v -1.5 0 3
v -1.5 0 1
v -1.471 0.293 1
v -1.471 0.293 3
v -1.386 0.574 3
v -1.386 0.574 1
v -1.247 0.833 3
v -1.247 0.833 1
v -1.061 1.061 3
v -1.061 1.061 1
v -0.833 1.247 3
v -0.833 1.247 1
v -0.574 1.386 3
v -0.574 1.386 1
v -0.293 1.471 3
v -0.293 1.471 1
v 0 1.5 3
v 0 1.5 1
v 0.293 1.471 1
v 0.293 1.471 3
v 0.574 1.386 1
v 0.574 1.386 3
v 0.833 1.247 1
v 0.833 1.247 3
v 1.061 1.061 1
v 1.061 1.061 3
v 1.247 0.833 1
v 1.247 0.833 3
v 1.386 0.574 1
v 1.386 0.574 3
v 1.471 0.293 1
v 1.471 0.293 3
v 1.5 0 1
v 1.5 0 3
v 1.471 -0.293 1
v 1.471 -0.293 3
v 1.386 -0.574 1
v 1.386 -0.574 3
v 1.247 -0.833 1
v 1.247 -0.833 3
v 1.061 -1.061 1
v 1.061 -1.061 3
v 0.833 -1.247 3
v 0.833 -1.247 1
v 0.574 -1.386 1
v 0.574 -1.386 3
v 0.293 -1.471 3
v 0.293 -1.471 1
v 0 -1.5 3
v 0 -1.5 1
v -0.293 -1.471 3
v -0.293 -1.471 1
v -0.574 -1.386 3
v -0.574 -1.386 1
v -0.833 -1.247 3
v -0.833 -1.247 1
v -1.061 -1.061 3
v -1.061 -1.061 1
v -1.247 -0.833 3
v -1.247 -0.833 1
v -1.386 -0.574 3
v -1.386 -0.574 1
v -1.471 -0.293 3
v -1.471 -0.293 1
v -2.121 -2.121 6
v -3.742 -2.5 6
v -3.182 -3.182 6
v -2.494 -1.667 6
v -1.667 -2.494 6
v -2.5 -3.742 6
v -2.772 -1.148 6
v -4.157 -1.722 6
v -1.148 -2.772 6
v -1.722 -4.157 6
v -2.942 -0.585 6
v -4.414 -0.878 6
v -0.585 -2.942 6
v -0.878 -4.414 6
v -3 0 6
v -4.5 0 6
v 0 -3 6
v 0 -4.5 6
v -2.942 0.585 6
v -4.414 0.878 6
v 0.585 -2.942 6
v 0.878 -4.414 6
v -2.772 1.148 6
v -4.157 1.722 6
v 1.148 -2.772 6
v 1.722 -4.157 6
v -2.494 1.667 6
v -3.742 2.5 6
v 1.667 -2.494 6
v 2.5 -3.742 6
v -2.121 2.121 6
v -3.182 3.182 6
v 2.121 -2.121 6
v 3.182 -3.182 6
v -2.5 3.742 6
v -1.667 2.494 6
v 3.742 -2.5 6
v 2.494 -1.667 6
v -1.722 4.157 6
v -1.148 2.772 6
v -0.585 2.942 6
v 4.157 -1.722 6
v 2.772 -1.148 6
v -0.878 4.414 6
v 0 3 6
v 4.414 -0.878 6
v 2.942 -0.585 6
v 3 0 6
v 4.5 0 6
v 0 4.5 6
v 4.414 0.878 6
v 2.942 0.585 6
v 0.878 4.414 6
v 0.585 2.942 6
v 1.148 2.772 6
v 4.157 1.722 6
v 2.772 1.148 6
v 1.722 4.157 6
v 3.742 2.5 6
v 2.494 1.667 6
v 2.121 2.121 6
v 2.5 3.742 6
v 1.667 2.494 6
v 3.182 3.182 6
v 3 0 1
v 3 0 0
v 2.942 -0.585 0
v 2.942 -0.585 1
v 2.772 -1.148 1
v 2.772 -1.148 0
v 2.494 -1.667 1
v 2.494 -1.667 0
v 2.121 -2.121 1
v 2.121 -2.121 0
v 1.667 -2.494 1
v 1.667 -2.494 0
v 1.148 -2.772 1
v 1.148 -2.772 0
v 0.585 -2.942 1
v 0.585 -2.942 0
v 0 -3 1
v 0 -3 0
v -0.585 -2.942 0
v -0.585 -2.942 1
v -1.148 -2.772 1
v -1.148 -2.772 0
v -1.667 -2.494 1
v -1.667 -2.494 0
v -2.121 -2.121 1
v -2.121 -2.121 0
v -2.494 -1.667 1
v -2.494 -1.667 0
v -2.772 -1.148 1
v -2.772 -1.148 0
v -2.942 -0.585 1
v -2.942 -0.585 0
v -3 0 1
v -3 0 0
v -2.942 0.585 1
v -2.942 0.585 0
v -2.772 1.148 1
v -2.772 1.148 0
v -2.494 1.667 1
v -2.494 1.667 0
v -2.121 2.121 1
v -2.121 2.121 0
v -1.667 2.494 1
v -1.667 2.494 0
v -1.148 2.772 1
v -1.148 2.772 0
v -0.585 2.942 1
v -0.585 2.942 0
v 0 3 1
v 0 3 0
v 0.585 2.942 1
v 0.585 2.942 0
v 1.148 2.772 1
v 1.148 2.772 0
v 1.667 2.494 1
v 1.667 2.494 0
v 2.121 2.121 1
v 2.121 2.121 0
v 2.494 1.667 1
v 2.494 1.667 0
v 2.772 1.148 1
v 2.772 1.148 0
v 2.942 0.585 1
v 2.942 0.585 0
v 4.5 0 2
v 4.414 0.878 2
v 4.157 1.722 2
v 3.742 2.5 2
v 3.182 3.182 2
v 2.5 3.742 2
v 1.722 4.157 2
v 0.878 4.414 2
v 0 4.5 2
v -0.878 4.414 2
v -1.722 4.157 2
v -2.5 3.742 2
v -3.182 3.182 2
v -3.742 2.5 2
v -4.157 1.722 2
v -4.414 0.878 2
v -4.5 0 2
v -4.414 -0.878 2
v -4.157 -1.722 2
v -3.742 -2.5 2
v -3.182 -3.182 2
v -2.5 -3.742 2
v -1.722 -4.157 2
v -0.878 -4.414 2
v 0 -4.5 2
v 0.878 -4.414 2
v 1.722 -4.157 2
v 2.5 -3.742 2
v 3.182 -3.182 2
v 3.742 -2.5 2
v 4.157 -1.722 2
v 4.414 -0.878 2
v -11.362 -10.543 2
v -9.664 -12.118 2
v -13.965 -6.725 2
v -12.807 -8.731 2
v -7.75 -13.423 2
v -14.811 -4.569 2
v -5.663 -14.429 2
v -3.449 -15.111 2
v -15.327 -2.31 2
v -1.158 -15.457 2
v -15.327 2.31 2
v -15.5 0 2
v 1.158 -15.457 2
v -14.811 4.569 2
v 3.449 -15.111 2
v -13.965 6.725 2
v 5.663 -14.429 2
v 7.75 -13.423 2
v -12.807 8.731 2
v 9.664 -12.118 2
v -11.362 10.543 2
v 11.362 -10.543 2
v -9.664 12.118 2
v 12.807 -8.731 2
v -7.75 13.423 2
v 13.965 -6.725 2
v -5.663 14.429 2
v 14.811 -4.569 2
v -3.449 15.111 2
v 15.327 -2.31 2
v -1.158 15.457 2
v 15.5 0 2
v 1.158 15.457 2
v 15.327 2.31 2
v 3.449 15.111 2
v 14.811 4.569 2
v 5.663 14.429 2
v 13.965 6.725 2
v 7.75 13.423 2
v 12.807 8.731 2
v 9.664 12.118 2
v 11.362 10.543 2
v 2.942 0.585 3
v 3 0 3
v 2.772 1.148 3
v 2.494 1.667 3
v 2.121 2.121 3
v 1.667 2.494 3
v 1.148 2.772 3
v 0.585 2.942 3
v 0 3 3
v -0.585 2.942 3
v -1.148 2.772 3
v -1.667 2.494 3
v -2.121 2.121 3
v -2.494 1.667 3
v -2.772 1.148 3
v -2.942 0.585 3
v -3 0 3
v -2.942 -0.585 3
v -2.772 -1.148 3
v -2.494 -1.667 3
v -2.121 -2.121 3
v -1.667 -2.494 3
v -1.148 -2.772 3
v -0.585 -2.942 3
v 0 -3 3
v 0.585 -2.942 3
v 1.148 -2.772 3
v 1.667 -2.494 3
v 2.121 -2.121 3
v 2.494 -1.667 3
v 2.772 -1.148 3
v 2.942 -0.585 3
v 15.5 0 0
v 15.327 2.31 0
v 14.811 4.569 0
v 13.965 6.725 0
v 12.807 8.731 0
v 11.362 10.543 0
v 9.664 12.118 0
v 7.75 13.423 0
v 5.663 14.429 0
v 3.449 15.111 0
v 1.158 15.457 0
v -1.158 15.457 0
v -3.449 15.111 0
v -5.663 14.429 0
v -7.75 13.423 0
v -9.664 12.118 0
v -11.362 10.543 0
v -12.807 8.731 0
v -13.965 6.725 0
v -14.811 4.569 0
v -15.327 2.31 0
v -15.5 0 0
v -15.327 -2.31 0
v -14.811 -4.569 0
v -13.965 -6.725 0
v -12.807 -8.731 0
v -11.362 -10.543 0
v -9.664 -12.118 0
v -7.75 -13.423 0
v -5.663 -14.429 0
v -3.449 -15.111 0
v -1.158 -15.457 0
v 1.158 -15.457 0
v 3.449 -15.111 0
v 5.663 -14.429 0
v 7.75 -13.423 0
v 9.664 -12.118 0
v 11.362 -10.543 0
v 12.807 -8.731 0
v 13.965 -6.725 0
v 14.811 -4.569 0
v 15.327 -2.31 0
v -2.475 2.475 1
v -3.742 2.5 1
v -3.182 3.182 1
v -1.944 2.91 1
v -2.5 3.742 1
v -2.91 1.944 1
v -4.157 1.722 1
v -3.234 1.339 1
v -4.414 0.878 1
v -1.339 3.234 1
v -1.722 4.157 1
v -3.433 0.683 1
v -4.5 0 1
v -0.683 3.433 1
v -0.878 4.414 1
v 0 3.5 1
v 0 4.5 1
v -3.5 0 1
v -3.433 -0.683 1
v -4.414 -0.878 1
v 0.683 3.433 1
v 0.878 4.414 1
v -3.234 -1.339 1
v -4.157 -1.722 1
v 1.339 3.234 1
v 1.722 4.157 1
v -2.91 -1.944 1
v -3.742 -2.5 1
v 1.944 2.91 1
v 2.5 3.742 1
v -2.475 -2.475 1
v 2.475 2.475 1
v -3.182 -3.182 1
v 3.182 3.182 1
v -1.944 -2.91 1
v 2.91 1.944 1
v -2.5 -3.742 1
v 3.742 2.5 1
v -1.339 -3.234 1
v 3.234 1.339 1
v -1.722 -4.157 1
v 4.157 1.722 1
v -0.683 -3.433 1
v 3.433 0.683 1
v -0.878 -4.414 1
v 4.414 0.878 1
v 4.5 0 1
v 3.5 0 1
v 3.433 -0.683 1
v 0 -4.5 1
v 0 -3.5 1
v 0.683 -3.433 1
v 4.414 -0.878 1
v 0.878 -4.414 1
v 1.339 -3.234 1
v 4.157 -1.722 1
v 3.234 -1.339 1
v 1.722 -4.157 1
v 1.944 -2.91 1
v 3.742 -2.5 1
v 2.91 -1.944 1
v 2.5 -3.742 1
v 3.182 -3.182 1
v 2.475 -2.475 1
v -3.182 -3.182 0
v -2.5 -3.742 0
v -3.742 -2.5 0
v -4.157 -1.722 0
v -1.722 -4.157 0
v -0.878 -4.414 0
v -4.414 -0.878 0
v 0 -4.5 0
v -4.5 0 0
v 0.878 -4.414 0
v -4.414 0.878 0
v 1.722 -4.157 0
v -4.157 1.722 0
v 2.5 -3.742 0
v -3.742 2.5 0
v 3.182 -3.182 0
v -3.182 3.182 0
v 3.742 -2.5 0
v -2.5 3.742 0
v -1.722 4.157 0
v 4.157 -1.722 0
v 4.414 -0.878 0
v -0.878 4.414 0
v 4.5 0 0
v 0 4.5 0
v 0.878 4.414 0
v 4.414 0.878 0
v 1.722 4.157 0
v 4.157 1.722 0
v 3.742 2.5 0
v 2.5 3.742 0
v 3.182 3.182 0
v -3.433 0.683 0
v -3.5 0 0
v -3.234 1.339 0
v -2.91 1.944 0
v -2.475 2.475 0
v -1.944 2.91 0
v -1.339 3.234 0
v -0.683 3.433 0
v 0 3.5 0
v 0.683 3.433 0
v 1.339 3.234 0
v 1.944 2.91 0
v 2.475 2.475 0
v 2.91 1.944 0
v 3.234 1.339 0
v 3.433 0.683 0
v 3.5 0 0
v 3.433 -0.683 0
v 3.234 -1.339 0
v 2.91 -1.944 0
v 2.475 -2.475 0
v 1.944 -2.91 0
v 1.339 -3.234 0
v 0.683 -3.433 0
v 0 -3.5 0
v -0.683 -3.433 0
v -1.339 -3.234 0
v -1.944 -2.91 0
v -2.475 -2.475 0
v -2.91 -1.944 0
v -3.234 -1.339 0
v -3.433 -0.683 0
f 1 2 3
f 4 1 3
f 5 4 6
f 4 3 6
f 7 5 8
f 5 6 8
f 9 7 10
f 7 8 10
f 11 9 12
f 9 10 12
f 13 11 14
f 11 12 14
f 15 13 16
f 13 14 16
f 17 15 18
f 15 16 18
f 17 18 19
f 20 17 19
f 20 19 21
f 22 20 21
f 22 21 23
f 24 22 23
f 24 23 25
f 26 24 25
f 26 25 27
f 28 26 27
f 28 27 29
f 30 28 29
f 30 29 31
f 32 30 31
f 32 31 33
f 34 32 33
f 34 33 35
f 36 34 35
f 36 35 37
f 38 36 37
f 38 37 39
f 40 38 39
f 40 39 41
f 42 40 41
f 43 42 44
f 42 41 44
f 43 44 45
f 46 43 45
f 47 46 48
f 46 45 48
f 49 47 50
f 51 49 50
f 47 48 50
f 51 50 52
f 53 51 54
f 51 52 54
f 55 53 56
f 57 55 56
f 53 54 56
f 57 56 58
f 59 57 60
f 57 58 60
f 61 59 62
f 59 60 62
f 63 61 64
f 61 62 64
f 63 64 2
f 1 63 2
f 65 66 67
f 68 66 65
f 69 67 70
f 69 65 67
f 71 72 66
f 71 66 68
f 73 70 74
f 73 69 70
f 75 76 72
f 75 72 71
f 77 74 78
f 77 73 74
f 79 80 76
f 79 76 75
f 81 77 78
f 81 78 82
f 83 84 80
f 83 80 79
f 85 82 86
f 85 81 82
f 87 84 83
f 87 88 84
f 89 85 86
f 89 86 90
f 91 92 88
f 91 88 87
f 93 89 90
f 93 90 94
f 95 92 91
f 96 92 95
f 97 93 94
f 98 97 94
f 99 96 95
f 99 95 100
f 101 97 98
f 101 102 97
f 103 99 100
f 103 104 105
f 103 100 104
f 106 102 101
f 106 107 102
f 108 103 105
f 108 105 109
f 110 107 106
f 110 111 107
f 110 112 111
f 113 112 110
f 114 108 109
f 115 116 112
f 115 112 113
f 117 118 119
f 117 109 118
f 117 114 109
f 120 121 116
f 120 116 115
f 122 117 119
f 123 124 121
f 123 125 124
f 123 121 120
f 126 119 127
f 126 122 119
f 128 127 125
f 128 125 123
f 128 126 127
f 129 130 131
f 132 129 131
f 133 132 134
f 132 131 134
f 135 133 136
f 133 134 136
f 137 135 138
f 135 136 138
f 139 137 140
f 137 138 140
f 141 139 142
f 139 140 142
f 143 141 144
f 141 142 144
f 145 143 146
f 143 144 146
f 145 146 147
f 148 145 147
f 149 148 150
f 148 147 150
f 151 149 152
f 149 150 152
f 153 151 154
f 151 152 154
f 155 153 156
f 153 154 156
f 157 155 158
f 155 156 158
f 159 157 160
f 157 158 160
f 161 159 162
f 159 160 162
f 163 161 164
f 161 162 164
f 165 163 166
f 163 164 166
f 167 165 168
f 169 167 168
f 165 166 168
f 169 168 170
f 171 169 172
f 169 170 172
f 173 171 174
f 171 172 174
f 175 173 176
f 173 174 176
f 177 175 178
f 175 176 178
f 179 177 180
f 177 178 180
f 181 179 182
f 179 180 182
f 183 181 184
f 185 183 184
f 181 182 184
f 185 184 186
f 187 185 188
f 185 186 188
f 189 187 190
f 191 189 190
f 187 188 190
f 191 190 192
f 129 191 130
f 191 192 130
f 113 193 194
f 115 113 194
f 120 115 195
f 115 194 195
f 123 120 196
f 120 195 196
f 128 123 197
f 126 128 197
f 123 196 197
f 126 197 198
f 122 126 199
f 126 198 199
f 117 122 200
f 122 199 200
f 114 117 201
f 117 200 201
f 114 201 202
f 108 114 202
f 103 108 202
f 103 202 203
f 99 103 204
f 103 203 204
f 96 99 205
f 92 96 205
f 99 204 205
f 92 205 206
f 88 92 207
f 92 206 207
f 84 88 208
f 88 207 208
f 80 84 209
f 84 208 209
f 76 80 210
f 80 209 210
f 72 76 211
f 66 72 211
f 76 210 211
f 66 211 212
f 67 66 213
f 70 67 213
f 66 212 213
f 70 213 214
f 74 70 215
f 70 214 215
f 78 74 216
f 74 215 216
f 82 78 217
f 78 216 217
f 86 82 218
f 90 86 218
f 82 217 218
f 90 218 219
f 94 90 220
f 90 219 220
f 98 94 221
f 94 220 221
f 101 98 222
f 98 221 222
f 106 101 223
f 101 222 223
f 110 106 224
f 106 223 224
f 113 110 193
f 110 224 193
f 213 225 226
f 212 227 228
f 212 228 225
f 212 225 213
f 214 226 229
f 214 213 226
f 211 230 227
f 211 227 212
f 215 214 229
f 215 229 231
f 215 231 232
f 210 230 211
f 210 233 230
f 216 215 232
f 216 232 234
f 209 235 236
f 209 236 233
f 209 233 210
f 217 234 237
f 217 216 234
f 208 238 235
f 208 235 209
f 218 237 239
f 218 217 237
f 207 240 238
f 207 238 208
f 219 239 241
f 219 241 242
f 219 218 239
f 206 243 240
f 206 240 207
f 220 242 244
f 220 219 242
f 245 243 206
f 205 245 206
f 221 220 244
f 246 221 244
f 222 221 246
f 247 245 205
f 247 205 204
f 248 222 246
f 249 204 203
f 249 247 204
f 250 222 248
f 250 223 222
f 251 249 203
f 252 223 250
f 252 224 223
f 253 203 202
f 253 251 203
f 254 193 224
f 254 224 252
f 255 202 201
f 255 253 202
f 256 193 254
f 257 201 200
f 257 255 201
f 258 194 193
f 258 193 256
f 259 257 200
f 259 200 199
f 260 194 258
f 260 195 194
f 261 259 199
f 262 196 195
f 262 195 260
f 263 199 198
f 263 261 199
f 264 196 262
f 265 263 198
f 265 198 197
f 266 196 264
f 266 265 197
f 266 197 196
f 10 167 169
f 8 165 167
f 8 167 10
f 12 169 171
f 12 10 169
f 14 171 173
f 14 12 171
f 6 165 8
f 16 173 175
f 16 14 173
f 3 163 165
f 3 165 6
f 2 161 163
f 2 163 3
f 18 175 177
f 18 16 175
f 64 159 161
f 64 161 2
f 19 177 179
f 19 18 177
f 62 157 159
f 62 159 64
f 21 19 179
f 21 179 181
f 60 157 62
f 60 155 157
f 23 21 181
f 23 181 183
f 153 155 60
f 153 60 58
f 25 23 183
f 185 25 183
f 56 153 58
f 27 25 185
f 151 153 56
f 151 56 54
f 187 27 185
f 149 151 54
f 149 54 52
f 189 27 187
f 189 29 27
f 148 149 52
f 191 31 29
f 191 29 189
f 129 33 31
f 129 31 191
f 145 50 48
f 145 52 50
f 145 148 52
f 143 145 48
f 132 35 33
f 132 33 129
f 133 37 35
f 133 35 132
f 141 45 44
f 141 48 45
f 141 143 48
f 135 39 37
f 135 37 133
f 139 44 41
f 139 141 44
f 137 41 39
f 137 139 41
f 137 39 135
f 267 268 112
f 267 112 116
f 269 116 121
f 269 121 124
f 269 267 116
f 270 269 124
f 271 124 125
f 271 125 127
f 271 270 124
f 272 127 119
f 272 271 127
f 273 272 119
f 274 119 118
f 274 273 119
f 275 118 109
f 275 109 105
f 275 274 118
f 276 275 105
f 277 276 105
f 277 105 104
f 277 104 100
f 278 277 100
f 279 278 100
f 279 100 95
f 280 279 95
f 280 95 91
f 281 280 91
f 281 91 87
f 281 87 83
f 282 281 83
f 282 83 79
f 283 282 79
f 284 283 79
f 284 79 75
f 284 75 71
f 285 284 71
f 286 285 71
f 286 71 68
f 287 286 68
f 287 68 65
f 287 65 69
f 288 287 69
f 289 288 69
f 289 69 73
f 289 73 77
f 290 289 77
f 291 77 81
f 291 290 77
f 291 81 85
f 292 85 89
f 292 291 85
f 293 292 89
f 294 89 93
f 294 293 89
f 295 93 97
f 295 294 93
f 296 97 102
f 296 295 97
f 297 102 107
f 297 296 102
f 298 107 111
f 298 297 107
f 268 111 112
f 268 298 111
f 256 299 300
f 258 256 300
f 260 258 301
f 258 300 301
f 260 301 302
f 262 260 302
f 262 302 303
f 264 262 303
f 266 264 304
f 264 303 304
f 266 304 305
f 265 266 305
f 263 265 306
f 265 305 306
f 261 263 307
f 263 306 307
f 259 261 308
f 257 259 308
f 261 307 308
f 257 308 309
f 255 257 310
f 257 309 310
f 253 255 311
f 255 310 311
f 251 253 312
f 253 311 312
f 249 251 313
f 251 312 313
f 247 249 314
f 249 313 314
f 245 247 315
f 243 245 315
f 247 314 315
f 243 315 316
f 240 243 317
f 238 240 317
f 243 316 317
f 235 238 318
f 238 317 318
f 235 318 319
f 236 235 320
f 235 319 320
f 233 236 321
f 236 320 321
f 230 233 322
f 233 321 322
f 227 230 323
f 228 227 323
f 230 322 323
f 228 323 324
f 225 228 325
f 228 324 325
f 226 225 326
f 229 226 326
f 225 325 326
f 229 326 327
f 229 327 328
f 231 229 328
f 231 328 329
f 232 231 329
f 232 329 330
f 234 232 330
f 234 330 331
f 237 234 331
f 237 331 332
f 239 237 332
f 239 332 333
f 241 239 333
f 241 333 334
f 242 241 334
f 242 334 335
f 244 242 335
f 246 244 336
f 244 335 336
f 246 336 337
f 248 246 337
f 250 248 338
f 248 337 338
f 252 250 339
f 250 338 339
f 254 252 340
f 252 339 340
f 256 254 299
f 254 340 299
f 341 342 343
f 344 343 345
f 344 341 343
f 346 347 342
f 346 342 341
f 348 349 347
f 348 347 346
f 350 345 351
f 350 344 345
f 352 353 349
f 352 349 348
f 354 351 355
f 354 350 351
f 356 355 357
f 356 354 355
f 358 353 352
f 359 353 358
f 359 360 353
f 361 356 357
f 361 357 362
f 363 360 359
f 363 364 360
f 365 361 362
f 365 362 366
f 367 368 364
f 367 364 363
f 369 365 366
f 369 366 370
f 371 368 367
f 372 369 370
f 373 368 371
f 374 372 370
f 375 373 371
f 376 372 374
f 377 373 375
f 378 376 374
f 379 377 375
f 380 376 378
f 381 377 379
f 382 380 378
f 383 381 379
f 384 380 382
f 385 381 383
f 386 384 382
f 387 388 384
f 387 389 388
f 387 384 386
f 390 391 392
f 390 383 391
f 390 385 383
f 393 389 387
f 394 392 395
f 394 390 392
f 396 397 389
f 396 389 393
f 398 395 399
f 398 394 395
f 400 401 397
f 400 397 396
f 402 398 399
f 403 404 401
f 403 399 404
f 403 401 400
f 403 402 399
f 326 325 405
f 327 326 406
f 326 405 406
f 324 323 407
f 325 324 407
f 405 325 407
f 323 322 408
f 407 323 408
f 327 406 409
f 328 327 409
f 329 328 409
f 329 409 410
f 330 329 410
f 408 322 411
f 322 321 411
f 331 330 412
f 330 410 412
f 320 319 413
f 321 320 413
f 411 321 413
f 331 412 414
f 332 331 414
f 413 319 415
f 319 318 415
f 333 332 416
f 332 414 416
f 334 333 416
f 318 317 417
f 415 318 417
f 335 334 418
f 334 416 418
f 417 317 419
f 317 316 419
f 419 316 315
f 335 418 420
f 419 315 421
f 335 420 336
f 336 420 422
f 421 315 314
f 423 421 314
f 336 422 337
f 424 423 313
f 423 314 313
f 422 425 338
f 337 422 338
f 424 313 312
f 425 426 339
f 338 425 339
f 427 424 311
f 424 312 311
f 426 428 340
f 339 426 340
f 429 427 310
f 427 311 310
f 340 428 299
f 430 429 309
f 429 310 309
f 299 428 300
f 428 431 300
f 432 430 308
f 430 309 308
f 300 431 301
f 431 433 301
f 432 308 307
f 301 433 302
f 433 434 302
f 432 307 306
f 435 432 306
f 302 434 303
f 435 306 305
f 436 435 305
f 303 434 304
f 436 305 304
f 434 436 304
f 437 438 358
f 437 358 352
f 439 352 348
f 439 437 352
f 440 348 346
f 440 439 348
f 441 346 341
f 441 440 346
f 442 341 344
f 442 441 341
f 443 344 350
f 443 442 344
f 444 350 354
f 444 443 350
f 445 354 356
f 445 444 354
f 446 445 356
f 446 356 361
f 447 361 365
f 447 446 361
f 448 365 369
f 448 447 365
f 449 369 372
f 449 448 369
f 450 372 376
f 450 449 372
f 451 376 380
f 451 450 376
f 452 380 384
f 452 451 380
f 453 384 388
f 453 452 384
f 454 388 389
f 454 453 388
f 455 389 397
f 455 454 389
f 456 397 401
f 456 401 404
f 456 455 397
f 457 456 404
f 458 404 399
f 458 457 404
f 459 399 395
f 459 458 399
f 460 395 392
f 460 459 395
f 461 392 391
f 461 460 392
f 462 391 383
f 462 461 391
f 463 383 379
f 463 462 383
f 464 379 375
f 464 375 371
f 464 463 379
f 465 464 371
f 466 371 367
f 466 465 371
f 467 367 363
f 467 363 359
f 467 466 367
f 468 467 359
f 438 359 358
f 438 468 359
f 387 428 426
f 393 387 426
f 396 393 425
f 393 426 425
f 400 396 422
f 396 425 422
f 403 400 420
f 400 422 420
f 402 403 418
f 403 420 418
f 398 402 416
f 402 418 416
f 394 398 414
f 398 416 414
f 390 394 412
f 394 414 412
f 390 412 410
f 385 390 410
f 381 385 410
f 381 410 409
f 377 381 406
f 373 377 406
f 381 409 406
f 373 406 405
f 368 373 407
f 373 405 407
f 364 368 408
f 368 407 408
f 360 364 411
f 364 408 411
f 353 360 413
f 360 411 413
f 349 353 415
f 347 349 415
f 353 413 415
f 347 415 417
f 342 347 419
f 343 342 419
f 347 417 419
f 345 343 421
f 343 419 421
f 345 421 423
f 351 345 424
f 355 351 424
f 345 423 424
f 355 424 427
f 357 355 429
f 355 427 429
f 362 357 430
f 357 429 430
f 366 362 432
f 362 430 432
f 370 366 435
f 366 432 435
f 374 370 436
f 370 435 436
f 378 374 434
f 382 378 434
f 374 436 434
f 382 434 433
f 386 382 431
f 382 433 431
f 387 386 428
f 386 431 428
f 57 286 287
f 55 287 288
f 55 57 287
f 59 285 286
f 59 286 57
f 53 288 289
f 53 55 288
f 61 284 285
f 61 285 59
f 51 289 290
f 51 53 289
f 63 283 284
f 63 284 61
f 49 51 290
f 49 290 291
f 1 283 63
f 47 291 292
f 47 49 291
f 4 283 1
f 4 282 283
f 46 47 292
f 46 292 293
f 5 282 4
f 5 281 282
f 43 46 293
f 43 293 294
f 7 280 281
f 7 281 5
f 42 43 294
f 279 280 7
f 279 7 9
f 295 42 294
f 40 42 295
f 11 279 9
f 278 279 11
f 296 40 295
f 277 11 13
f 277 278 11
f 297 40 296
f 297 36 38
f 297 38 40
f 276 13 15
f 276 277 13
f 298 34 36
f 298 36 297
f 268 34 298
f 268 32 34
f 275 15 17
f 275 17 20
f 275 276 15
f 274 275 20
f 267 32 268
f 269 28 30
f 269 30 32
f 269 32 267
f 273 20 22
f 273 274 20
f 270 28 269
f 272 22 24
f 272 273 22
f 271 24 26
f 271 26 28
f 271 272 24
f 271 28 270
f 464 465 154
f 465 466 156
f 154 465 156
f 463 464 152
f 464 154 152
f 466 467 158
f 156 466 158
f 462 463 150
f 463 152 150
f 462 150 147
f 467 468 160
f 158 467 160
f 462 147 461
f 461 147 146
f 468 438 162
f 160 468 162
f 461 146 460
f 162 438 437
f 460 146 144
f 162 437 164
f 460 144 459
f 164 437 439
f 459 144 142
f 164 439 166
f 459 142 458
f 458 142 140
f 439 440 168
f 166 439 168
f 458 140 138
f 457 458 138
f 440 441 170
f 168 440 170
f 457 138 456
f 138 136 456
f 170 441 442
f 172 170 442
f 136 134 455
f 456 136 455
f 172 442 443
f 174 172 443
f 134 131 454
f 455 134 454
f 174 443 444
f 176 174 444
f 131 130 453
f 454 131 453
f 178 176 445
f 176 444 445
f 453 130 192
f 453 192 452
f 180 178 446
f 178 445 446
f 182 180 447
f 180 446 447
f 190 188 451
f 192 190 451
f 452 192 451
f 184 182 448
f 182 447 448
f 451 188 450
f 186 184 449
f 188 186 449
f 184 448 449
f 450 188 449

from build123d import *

# Parameters (mm, degrees)
SCHIZZO1_R                   = 15.5
ESTRUSIONE_ESTRUSIONE1_DEPTH = 2
SCHIZZO2_R                   = 4.5
SCHIZZO2_R_2                 = 3
ESTRUSIONE_ESTRUSIONE2_DEPTH = 4
SCHIZZO3_R                   = 3
ESTRUSIONE_ESTRUSIONE3_DEPTH = 1
SCHIZZO4_R                   = 4.5
SCHIZZO4_R_2                 = 3.5
SCHIZZO4_R_3                 = 3
TAGLIO_ESTRUSIONE1_DEPTH     = 1
SCHIZZO5_R                   = 1.5
TAGLIO_ESTRUSIONE2_DEPTH     = 12


with BuildPart() as part:
    # Schizzo1 → Estrusione-Estrusione1 (new body)
    with BuildSketch(Plane.XY):
        Circle(SCHIZZO1_R)
    extrude(amount=ESTRUSIONE_ESTRUSIONE1_DEPTH)

    # Schizzo2 → Estrusione-Estrusione2 (add)
    with BuildSketch(Plane.XY.offset(2)):
        Circle(SCHIZZO2_R)
        Circle(SCHIZZO2_R_2, mode=Mode.SUBTRACT)
    extrude(amount=ESTRUSIONE_ESTRUSIONE2_DEPTH)

    # Schizzo3 → Estrusione-Estrusione3 (add)
    with BuildSketch(Plane.XY.offset(2)):
        Circle(SCHIZZO3_R)
    extrude(amount=ESTRUSIONE_ESTRUSIONE3_DEPTH)

    # Schizzo4 → Taglio-Estrusione1 (cut)
    with BuildSketch(Plane(origin=(0, 0, 0), x_dir=(-1, 0, 0), z_dir=(0, 0, -1))):
        with Locations(Location((0, 0, 0), (0, 0, 180))):
            Circle(SCHIZZO4_R)
        Circle(SCHIZZO4_R_2, mode=Mode.SUBTRACT)
        with Locations(Location((0, 0, 0), (0, 0, 180))):
            Circle(SCHIZZO4_R_3)
    extrude(amount=-TAGLIO_ESTRUSIONE1_DEPTH, mode=Mode.SUBTRACT)

    # Schizzo5 → Taglio-Estrusione2 (cut)
    with BuildSketch(Plane(origin=(0, 0, 1), x_dir=(-1, 0, 0), z_dir=(0, 0, -1))):
        Circle(SCHIZZO5_R)
    extrude(amount=-TAGLIO_ESTRUSIONE2_DEPTH, mode=Mode.SUBTRACT)


solid = part.part
